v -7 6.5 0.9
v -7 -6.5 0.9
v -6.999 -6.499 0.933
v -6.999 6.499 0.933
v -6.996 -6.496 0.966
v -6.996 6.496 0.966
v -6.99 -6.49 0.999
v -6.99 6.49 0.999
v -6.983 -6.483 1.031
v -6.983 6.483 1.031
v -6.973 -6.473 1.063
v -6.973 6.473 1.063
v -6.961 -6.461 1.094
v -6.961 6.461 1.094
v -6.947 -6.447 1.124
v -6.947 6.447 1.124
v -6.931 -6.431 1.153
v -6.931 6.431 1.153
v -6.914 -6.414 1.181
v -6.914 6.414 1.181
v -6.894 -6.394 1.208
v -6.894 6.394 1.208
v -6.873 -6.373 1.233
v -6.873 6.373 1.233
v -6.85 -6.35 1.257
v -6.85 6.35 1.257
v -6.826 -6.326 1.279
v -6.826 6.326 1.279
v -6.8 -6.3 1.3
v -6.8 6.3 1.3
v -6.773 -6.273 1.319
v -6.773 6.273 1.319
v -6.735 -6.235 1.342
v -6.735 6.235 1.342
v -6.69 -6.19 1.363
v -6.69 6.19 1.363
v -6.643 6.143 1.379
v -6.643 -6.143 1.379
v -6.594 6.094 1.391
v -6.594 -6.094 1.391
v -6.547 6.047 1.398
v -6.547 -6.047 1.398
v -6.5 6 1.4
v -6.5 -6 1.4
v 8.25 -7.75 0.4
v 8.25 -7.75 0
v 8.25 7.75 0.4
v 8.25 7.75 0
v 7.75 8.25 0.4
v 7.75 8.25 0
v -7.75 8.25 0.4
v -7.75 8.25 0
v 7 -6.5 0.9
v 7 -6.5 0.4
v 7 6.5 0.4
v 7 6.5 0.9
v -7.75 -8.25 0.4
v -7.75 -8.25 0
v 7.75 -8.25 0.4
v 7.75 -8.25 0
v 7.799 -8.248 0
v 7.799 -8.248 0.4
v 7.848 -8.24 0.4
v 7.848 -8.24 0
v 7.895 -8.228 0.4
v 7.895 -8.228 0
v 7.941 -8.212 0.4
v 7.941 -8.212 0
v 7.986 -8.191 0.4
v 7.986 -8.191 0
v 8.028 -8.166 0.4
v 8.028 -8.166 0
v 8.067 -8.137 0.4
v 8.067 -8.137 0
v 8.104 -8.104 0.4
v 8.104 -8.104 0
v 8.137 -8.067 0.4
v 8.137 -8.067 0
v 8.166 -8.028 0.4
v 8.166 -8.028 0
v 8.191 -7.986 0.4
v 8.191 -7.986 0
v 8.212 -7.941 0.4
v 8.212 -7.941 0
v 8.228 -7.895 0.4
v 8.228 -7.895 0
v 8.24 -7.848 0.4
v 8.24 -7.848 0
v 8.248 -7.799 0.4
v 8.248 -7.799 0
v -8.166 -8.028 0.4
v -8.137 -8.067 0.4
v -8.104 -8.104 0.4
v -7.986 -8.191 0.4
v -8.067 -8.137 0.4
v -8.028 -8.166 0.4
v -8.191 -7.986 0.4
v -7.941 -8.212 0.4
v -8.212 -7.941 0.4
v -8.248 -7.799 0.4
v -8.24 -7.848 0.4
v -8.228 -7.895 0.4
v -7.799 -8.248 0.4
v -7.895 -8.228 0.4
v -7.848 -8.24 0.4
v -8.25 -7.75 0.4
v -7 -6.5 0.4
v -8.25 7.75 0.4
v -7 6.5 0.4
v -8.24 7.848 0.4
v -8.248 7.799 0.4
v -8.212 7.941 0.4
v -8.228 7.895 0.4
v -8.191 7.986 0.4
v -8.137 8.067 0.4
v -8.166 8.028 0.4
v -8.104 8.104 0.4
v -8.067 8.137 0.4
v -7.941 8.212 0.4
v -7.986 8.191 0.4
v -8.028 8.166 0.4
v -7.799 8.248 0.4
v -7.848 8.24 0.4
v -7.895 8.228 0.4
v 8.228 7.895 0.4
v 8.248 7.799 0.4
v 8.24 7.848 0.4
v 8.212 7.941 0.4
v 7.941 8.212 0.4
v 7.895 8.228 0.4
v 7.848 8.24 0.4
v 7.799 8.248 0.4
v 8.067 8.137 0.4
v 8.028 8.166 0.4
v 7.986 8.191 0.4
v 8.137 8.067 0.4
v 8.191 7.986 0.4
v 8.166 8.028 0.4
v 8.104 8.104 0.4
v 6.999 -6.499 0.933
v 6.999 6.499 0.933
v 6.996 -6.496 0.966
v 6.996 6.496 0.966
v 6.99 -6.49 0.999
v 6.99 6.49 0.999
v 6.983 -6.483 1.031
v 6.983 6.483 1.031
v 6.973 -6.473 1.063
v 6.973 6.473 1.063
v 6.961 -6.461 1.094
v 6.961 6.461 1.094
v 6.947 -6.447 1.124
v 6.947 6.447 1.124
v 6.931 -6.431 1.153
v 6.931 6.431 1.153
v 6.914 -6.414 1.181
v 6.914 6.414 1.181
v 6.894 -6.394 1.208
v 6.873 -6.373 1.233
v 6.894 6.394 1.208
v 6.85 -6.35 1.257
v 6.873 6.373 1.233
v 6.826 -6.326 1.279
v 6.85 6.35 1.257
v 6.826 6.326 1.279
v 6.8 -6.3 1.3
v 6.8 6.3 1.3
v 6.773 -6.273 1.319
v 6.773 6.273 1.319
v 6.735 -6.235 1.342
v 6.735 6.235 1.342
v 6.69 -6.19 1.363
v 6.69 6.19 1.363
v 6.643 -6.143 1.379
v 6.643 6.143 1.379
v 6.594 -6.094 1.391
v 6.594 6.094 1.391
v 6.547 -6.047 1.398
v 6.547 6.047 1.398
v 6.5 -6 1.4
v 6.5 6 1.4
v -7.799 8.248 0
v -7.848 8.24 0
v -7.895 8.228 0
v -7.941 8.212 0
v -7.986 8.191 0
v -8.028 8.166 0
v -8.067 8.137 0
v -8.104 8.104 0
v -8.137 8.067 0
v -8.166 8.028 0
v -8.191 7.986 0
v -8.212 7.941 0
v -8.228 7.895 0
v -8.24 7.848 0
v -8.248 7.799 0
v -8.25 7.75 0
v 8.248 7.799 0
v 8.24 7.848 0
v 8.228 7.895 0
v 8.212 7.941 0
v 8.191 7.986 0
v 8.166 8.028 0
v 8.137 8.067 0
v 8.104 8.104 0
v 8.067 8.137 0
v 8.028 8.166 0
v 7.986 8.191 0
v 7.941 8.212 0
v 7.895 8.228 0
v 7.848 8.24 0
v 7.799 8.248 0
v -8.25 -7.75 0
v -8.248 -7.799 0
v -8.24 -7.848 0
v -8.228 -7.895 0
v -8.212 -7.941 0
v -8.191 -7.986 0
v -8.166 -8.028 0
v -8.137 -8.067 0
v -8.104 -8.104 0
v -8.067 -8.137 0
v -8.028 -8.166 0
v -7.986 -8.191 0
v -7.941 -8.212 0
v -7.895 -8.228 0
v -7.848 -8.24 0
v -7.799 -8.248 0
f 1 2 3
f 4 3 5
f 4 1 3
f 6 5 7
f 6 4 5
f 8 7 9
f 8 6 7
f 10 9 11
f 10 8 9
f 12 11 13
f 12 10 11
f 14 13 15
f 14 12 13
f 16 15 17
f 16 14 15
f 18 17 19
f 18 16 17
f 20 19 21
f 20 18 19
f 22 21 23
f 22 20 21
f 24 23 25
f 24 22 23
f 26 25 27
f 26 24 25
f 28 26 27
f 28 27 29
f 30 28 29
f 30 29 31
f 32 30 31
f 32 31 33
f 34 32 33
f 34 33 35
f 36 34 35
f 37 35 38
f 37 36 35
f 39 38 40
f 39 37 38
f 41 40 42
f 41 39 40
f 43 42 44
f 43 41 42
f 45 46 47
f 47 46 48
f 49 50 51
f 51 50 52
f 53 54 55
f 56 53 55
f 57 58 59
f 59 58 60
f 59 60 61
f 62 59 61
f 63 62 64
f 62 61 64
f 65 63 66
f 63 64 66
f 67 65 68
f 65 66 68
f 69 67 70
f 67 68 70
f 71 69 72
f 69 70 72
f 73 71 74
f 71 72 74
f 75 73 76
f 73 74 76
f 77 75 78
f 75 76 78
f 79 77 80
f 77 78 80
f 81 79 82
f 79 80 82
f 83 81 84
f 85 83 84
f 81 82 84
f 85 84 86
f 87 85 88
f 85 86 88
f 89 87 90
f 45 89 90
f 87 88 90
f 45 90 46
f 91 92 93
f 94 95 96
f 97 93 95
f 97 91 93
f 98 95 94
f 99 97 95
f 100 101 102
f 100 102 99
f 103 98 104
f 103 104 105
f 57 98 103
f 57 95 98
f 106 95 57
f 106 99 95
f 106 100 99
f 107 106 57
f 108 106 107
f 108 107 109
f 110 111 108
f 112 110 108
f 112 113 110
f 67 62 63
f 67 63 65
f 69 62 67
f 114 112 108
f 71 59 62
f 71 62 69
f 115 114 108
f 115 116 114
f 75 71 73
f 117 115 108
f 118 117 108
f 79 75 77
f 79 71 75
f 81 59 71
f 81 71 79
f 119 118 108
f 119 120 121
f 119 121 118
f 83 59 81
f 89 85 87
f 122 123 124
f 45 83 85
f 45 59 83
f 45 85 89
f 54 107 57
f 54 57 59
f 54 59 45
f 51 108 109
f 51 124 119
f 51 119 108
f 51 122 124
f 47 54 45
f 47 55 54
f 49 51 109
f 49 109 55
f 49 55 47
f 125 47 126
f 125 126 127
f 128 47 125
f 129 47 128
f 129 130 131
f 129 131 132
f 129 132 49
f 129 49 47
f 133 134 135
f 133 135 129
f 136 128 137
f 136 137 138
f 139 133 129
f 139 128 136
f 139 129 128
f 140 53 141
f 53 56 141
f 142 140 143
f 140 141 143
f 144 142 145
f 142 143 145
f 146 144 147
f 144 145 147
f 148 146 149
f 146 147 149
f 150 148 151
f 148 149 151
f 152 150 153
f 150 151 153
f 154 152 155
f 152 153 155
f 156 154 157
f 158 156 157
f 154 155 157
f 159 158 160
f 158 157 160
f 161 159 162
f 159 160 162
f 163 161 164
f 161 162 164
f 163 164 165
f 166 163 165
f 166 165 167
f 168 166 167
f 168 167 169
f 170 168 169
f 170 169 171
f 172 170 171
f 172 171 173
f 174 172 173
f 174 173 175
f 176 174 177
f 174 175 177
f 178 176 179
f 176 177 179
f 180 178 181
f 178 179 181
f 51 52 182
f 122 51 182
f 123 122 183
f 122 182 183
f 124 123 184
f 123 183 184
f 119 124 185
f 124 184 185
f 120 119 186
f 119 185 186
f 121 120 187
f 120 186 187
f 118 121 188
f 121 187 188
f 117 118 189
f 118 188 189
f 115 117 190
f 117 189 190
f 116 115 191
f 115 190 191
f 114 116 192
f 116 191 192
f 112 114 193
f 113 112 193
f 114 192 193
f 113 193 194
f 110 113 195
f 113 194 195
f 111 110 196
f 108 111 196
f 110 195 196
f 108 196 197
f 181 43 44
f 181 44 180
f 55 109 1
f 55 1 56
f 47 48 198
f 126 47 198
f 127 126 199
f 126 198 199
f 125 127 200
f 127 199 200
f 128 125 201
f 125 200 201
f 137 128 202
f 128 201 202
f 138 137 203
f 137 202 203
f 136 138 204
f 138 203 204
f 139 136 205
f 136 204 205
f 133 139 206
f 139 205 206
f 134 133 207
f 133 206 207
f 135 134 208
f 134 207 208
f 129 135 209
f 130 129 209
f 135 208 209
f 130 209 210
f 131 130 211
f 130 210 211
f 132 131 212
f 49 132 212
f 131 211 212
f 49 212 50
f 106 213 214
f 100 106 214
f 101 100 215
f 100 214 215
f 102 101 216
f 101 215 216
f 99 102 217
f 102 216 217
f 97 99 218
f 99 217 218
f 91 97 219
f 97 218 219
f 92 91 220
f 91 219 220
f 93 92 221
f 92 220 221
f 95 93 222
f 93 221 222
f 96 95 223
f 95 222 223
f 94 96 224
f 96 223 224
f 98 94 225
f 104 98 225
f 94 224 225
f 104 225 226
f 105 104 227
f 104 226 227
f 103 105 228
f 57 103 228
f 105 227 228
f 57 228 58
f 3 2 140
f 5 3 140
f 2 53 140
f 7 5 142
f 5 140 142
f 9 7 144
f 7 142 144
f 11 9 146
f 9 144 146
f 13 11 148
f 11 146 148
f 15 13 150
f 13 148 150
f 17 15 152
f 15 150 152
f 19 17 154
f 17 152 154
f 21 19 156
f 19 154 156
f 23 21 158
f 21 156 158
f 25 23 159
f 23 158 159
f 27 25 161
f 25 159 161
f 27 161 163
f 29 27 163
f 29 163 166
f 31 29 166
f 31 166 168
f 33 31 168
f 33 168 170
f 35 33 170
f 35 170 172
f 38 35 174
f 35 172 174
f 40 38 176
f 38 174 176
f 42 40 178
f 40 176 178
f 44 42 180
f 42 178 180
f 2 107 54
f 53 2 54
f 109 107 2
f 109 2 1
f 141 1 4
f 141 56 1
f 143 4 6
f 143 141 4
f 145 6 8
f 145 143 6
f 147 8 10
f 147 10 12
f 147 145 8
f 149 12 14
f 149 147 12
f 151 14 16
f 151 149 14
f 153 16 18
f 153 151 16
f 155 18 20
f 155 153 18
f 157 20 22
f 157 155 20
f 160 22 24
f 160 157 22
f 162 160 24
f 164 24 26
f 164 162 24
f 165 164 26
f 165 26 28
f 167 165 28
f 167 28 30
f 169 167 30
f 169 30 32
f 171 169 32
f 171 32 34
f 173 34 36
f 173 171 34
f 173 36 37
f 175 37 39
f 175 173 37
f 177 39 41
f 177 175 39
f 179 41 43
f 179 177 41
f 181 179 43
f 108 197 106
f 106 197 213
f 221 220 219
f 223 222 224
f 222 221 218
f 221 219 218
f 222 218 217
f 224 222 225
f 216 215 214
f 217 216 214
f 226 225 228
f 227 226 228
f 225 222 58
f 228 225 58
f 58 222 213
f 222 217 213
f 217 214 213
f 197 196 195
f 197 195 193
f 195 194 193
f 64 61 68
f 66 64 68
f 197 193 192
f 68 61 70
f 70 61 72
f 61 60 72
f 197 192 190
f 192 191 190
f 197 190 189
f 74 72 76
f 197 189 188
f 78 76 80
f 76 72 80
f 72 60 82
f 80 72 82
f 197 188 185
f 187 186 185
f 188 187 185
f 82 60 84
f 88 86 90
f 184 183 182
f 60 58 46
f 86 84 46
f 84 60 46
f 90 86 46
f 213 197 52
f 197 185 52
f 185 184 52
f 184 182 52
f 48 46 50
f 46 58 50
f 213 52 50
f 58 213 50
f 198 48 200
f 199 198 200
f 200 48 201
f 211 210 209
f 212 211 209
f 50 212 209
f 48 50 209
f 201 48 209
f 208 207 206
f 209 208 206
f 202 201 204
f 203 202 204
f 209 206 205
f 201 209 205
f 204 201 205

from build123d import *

# Parameters (mm, degrees)
PAD002_DEPTH = 0.4
SKETCH005_W  = 14
SKETCH005_H  = 13
PAD003_DEPTH = 1
FILLET_R     = 0.5


with BuildPart() as part:
    # Sketch004 → Pad002 (new body)
    with BuildSketch(Plane.XY):
        with BuildLine():
            Line((-8.25, 7.75), (-8.25, -7.75))
            ThreePointArc((-8.25, -7.75), (-8.103553, -8.103553), (-7.75, -8.25))
            Line((-7.75, -8.25), (7.75, -8.25))
            ThreePointArc((7.75, -8.25), (8.103553, -8.103553), (8.25, -7.75))
            Line((8.25, -7.75), (8.25, 7.75))
            ThreePointArc((8.25, 7.75), (8.103553, 8.103553), (7.75, 8.25))
            Line((7.75, 8.25), (-7.75, 8.25))
            ThreePointArc((-7.75, 8.25), (-8.103553, 8.103553), (-8.25, 7.75))
        make_face()
    extrude(amount=PAD002_DEPTH)

    # Sketch005 (on Face10 of Pad002) → Pad003 (join)
    with BuildSketch(Plane.XY.offset(0.4)):
        Rectangle(SKETCH005_W, SKETCH005_H)
    extrude(amount=PAD003_DEPTH)

    # Fillet
    fillet_edges = [part.edges().sort_by_distance(p)[0] for p in [
        (-7, 0, 1.4),
        (0, -6.5, 1.4),
        (7, 0, 1.4),
        (0, 6.5, 1.4),
    ]]
    fillet(fillet_edges, radius=FILLET_R)


solid = part.part
